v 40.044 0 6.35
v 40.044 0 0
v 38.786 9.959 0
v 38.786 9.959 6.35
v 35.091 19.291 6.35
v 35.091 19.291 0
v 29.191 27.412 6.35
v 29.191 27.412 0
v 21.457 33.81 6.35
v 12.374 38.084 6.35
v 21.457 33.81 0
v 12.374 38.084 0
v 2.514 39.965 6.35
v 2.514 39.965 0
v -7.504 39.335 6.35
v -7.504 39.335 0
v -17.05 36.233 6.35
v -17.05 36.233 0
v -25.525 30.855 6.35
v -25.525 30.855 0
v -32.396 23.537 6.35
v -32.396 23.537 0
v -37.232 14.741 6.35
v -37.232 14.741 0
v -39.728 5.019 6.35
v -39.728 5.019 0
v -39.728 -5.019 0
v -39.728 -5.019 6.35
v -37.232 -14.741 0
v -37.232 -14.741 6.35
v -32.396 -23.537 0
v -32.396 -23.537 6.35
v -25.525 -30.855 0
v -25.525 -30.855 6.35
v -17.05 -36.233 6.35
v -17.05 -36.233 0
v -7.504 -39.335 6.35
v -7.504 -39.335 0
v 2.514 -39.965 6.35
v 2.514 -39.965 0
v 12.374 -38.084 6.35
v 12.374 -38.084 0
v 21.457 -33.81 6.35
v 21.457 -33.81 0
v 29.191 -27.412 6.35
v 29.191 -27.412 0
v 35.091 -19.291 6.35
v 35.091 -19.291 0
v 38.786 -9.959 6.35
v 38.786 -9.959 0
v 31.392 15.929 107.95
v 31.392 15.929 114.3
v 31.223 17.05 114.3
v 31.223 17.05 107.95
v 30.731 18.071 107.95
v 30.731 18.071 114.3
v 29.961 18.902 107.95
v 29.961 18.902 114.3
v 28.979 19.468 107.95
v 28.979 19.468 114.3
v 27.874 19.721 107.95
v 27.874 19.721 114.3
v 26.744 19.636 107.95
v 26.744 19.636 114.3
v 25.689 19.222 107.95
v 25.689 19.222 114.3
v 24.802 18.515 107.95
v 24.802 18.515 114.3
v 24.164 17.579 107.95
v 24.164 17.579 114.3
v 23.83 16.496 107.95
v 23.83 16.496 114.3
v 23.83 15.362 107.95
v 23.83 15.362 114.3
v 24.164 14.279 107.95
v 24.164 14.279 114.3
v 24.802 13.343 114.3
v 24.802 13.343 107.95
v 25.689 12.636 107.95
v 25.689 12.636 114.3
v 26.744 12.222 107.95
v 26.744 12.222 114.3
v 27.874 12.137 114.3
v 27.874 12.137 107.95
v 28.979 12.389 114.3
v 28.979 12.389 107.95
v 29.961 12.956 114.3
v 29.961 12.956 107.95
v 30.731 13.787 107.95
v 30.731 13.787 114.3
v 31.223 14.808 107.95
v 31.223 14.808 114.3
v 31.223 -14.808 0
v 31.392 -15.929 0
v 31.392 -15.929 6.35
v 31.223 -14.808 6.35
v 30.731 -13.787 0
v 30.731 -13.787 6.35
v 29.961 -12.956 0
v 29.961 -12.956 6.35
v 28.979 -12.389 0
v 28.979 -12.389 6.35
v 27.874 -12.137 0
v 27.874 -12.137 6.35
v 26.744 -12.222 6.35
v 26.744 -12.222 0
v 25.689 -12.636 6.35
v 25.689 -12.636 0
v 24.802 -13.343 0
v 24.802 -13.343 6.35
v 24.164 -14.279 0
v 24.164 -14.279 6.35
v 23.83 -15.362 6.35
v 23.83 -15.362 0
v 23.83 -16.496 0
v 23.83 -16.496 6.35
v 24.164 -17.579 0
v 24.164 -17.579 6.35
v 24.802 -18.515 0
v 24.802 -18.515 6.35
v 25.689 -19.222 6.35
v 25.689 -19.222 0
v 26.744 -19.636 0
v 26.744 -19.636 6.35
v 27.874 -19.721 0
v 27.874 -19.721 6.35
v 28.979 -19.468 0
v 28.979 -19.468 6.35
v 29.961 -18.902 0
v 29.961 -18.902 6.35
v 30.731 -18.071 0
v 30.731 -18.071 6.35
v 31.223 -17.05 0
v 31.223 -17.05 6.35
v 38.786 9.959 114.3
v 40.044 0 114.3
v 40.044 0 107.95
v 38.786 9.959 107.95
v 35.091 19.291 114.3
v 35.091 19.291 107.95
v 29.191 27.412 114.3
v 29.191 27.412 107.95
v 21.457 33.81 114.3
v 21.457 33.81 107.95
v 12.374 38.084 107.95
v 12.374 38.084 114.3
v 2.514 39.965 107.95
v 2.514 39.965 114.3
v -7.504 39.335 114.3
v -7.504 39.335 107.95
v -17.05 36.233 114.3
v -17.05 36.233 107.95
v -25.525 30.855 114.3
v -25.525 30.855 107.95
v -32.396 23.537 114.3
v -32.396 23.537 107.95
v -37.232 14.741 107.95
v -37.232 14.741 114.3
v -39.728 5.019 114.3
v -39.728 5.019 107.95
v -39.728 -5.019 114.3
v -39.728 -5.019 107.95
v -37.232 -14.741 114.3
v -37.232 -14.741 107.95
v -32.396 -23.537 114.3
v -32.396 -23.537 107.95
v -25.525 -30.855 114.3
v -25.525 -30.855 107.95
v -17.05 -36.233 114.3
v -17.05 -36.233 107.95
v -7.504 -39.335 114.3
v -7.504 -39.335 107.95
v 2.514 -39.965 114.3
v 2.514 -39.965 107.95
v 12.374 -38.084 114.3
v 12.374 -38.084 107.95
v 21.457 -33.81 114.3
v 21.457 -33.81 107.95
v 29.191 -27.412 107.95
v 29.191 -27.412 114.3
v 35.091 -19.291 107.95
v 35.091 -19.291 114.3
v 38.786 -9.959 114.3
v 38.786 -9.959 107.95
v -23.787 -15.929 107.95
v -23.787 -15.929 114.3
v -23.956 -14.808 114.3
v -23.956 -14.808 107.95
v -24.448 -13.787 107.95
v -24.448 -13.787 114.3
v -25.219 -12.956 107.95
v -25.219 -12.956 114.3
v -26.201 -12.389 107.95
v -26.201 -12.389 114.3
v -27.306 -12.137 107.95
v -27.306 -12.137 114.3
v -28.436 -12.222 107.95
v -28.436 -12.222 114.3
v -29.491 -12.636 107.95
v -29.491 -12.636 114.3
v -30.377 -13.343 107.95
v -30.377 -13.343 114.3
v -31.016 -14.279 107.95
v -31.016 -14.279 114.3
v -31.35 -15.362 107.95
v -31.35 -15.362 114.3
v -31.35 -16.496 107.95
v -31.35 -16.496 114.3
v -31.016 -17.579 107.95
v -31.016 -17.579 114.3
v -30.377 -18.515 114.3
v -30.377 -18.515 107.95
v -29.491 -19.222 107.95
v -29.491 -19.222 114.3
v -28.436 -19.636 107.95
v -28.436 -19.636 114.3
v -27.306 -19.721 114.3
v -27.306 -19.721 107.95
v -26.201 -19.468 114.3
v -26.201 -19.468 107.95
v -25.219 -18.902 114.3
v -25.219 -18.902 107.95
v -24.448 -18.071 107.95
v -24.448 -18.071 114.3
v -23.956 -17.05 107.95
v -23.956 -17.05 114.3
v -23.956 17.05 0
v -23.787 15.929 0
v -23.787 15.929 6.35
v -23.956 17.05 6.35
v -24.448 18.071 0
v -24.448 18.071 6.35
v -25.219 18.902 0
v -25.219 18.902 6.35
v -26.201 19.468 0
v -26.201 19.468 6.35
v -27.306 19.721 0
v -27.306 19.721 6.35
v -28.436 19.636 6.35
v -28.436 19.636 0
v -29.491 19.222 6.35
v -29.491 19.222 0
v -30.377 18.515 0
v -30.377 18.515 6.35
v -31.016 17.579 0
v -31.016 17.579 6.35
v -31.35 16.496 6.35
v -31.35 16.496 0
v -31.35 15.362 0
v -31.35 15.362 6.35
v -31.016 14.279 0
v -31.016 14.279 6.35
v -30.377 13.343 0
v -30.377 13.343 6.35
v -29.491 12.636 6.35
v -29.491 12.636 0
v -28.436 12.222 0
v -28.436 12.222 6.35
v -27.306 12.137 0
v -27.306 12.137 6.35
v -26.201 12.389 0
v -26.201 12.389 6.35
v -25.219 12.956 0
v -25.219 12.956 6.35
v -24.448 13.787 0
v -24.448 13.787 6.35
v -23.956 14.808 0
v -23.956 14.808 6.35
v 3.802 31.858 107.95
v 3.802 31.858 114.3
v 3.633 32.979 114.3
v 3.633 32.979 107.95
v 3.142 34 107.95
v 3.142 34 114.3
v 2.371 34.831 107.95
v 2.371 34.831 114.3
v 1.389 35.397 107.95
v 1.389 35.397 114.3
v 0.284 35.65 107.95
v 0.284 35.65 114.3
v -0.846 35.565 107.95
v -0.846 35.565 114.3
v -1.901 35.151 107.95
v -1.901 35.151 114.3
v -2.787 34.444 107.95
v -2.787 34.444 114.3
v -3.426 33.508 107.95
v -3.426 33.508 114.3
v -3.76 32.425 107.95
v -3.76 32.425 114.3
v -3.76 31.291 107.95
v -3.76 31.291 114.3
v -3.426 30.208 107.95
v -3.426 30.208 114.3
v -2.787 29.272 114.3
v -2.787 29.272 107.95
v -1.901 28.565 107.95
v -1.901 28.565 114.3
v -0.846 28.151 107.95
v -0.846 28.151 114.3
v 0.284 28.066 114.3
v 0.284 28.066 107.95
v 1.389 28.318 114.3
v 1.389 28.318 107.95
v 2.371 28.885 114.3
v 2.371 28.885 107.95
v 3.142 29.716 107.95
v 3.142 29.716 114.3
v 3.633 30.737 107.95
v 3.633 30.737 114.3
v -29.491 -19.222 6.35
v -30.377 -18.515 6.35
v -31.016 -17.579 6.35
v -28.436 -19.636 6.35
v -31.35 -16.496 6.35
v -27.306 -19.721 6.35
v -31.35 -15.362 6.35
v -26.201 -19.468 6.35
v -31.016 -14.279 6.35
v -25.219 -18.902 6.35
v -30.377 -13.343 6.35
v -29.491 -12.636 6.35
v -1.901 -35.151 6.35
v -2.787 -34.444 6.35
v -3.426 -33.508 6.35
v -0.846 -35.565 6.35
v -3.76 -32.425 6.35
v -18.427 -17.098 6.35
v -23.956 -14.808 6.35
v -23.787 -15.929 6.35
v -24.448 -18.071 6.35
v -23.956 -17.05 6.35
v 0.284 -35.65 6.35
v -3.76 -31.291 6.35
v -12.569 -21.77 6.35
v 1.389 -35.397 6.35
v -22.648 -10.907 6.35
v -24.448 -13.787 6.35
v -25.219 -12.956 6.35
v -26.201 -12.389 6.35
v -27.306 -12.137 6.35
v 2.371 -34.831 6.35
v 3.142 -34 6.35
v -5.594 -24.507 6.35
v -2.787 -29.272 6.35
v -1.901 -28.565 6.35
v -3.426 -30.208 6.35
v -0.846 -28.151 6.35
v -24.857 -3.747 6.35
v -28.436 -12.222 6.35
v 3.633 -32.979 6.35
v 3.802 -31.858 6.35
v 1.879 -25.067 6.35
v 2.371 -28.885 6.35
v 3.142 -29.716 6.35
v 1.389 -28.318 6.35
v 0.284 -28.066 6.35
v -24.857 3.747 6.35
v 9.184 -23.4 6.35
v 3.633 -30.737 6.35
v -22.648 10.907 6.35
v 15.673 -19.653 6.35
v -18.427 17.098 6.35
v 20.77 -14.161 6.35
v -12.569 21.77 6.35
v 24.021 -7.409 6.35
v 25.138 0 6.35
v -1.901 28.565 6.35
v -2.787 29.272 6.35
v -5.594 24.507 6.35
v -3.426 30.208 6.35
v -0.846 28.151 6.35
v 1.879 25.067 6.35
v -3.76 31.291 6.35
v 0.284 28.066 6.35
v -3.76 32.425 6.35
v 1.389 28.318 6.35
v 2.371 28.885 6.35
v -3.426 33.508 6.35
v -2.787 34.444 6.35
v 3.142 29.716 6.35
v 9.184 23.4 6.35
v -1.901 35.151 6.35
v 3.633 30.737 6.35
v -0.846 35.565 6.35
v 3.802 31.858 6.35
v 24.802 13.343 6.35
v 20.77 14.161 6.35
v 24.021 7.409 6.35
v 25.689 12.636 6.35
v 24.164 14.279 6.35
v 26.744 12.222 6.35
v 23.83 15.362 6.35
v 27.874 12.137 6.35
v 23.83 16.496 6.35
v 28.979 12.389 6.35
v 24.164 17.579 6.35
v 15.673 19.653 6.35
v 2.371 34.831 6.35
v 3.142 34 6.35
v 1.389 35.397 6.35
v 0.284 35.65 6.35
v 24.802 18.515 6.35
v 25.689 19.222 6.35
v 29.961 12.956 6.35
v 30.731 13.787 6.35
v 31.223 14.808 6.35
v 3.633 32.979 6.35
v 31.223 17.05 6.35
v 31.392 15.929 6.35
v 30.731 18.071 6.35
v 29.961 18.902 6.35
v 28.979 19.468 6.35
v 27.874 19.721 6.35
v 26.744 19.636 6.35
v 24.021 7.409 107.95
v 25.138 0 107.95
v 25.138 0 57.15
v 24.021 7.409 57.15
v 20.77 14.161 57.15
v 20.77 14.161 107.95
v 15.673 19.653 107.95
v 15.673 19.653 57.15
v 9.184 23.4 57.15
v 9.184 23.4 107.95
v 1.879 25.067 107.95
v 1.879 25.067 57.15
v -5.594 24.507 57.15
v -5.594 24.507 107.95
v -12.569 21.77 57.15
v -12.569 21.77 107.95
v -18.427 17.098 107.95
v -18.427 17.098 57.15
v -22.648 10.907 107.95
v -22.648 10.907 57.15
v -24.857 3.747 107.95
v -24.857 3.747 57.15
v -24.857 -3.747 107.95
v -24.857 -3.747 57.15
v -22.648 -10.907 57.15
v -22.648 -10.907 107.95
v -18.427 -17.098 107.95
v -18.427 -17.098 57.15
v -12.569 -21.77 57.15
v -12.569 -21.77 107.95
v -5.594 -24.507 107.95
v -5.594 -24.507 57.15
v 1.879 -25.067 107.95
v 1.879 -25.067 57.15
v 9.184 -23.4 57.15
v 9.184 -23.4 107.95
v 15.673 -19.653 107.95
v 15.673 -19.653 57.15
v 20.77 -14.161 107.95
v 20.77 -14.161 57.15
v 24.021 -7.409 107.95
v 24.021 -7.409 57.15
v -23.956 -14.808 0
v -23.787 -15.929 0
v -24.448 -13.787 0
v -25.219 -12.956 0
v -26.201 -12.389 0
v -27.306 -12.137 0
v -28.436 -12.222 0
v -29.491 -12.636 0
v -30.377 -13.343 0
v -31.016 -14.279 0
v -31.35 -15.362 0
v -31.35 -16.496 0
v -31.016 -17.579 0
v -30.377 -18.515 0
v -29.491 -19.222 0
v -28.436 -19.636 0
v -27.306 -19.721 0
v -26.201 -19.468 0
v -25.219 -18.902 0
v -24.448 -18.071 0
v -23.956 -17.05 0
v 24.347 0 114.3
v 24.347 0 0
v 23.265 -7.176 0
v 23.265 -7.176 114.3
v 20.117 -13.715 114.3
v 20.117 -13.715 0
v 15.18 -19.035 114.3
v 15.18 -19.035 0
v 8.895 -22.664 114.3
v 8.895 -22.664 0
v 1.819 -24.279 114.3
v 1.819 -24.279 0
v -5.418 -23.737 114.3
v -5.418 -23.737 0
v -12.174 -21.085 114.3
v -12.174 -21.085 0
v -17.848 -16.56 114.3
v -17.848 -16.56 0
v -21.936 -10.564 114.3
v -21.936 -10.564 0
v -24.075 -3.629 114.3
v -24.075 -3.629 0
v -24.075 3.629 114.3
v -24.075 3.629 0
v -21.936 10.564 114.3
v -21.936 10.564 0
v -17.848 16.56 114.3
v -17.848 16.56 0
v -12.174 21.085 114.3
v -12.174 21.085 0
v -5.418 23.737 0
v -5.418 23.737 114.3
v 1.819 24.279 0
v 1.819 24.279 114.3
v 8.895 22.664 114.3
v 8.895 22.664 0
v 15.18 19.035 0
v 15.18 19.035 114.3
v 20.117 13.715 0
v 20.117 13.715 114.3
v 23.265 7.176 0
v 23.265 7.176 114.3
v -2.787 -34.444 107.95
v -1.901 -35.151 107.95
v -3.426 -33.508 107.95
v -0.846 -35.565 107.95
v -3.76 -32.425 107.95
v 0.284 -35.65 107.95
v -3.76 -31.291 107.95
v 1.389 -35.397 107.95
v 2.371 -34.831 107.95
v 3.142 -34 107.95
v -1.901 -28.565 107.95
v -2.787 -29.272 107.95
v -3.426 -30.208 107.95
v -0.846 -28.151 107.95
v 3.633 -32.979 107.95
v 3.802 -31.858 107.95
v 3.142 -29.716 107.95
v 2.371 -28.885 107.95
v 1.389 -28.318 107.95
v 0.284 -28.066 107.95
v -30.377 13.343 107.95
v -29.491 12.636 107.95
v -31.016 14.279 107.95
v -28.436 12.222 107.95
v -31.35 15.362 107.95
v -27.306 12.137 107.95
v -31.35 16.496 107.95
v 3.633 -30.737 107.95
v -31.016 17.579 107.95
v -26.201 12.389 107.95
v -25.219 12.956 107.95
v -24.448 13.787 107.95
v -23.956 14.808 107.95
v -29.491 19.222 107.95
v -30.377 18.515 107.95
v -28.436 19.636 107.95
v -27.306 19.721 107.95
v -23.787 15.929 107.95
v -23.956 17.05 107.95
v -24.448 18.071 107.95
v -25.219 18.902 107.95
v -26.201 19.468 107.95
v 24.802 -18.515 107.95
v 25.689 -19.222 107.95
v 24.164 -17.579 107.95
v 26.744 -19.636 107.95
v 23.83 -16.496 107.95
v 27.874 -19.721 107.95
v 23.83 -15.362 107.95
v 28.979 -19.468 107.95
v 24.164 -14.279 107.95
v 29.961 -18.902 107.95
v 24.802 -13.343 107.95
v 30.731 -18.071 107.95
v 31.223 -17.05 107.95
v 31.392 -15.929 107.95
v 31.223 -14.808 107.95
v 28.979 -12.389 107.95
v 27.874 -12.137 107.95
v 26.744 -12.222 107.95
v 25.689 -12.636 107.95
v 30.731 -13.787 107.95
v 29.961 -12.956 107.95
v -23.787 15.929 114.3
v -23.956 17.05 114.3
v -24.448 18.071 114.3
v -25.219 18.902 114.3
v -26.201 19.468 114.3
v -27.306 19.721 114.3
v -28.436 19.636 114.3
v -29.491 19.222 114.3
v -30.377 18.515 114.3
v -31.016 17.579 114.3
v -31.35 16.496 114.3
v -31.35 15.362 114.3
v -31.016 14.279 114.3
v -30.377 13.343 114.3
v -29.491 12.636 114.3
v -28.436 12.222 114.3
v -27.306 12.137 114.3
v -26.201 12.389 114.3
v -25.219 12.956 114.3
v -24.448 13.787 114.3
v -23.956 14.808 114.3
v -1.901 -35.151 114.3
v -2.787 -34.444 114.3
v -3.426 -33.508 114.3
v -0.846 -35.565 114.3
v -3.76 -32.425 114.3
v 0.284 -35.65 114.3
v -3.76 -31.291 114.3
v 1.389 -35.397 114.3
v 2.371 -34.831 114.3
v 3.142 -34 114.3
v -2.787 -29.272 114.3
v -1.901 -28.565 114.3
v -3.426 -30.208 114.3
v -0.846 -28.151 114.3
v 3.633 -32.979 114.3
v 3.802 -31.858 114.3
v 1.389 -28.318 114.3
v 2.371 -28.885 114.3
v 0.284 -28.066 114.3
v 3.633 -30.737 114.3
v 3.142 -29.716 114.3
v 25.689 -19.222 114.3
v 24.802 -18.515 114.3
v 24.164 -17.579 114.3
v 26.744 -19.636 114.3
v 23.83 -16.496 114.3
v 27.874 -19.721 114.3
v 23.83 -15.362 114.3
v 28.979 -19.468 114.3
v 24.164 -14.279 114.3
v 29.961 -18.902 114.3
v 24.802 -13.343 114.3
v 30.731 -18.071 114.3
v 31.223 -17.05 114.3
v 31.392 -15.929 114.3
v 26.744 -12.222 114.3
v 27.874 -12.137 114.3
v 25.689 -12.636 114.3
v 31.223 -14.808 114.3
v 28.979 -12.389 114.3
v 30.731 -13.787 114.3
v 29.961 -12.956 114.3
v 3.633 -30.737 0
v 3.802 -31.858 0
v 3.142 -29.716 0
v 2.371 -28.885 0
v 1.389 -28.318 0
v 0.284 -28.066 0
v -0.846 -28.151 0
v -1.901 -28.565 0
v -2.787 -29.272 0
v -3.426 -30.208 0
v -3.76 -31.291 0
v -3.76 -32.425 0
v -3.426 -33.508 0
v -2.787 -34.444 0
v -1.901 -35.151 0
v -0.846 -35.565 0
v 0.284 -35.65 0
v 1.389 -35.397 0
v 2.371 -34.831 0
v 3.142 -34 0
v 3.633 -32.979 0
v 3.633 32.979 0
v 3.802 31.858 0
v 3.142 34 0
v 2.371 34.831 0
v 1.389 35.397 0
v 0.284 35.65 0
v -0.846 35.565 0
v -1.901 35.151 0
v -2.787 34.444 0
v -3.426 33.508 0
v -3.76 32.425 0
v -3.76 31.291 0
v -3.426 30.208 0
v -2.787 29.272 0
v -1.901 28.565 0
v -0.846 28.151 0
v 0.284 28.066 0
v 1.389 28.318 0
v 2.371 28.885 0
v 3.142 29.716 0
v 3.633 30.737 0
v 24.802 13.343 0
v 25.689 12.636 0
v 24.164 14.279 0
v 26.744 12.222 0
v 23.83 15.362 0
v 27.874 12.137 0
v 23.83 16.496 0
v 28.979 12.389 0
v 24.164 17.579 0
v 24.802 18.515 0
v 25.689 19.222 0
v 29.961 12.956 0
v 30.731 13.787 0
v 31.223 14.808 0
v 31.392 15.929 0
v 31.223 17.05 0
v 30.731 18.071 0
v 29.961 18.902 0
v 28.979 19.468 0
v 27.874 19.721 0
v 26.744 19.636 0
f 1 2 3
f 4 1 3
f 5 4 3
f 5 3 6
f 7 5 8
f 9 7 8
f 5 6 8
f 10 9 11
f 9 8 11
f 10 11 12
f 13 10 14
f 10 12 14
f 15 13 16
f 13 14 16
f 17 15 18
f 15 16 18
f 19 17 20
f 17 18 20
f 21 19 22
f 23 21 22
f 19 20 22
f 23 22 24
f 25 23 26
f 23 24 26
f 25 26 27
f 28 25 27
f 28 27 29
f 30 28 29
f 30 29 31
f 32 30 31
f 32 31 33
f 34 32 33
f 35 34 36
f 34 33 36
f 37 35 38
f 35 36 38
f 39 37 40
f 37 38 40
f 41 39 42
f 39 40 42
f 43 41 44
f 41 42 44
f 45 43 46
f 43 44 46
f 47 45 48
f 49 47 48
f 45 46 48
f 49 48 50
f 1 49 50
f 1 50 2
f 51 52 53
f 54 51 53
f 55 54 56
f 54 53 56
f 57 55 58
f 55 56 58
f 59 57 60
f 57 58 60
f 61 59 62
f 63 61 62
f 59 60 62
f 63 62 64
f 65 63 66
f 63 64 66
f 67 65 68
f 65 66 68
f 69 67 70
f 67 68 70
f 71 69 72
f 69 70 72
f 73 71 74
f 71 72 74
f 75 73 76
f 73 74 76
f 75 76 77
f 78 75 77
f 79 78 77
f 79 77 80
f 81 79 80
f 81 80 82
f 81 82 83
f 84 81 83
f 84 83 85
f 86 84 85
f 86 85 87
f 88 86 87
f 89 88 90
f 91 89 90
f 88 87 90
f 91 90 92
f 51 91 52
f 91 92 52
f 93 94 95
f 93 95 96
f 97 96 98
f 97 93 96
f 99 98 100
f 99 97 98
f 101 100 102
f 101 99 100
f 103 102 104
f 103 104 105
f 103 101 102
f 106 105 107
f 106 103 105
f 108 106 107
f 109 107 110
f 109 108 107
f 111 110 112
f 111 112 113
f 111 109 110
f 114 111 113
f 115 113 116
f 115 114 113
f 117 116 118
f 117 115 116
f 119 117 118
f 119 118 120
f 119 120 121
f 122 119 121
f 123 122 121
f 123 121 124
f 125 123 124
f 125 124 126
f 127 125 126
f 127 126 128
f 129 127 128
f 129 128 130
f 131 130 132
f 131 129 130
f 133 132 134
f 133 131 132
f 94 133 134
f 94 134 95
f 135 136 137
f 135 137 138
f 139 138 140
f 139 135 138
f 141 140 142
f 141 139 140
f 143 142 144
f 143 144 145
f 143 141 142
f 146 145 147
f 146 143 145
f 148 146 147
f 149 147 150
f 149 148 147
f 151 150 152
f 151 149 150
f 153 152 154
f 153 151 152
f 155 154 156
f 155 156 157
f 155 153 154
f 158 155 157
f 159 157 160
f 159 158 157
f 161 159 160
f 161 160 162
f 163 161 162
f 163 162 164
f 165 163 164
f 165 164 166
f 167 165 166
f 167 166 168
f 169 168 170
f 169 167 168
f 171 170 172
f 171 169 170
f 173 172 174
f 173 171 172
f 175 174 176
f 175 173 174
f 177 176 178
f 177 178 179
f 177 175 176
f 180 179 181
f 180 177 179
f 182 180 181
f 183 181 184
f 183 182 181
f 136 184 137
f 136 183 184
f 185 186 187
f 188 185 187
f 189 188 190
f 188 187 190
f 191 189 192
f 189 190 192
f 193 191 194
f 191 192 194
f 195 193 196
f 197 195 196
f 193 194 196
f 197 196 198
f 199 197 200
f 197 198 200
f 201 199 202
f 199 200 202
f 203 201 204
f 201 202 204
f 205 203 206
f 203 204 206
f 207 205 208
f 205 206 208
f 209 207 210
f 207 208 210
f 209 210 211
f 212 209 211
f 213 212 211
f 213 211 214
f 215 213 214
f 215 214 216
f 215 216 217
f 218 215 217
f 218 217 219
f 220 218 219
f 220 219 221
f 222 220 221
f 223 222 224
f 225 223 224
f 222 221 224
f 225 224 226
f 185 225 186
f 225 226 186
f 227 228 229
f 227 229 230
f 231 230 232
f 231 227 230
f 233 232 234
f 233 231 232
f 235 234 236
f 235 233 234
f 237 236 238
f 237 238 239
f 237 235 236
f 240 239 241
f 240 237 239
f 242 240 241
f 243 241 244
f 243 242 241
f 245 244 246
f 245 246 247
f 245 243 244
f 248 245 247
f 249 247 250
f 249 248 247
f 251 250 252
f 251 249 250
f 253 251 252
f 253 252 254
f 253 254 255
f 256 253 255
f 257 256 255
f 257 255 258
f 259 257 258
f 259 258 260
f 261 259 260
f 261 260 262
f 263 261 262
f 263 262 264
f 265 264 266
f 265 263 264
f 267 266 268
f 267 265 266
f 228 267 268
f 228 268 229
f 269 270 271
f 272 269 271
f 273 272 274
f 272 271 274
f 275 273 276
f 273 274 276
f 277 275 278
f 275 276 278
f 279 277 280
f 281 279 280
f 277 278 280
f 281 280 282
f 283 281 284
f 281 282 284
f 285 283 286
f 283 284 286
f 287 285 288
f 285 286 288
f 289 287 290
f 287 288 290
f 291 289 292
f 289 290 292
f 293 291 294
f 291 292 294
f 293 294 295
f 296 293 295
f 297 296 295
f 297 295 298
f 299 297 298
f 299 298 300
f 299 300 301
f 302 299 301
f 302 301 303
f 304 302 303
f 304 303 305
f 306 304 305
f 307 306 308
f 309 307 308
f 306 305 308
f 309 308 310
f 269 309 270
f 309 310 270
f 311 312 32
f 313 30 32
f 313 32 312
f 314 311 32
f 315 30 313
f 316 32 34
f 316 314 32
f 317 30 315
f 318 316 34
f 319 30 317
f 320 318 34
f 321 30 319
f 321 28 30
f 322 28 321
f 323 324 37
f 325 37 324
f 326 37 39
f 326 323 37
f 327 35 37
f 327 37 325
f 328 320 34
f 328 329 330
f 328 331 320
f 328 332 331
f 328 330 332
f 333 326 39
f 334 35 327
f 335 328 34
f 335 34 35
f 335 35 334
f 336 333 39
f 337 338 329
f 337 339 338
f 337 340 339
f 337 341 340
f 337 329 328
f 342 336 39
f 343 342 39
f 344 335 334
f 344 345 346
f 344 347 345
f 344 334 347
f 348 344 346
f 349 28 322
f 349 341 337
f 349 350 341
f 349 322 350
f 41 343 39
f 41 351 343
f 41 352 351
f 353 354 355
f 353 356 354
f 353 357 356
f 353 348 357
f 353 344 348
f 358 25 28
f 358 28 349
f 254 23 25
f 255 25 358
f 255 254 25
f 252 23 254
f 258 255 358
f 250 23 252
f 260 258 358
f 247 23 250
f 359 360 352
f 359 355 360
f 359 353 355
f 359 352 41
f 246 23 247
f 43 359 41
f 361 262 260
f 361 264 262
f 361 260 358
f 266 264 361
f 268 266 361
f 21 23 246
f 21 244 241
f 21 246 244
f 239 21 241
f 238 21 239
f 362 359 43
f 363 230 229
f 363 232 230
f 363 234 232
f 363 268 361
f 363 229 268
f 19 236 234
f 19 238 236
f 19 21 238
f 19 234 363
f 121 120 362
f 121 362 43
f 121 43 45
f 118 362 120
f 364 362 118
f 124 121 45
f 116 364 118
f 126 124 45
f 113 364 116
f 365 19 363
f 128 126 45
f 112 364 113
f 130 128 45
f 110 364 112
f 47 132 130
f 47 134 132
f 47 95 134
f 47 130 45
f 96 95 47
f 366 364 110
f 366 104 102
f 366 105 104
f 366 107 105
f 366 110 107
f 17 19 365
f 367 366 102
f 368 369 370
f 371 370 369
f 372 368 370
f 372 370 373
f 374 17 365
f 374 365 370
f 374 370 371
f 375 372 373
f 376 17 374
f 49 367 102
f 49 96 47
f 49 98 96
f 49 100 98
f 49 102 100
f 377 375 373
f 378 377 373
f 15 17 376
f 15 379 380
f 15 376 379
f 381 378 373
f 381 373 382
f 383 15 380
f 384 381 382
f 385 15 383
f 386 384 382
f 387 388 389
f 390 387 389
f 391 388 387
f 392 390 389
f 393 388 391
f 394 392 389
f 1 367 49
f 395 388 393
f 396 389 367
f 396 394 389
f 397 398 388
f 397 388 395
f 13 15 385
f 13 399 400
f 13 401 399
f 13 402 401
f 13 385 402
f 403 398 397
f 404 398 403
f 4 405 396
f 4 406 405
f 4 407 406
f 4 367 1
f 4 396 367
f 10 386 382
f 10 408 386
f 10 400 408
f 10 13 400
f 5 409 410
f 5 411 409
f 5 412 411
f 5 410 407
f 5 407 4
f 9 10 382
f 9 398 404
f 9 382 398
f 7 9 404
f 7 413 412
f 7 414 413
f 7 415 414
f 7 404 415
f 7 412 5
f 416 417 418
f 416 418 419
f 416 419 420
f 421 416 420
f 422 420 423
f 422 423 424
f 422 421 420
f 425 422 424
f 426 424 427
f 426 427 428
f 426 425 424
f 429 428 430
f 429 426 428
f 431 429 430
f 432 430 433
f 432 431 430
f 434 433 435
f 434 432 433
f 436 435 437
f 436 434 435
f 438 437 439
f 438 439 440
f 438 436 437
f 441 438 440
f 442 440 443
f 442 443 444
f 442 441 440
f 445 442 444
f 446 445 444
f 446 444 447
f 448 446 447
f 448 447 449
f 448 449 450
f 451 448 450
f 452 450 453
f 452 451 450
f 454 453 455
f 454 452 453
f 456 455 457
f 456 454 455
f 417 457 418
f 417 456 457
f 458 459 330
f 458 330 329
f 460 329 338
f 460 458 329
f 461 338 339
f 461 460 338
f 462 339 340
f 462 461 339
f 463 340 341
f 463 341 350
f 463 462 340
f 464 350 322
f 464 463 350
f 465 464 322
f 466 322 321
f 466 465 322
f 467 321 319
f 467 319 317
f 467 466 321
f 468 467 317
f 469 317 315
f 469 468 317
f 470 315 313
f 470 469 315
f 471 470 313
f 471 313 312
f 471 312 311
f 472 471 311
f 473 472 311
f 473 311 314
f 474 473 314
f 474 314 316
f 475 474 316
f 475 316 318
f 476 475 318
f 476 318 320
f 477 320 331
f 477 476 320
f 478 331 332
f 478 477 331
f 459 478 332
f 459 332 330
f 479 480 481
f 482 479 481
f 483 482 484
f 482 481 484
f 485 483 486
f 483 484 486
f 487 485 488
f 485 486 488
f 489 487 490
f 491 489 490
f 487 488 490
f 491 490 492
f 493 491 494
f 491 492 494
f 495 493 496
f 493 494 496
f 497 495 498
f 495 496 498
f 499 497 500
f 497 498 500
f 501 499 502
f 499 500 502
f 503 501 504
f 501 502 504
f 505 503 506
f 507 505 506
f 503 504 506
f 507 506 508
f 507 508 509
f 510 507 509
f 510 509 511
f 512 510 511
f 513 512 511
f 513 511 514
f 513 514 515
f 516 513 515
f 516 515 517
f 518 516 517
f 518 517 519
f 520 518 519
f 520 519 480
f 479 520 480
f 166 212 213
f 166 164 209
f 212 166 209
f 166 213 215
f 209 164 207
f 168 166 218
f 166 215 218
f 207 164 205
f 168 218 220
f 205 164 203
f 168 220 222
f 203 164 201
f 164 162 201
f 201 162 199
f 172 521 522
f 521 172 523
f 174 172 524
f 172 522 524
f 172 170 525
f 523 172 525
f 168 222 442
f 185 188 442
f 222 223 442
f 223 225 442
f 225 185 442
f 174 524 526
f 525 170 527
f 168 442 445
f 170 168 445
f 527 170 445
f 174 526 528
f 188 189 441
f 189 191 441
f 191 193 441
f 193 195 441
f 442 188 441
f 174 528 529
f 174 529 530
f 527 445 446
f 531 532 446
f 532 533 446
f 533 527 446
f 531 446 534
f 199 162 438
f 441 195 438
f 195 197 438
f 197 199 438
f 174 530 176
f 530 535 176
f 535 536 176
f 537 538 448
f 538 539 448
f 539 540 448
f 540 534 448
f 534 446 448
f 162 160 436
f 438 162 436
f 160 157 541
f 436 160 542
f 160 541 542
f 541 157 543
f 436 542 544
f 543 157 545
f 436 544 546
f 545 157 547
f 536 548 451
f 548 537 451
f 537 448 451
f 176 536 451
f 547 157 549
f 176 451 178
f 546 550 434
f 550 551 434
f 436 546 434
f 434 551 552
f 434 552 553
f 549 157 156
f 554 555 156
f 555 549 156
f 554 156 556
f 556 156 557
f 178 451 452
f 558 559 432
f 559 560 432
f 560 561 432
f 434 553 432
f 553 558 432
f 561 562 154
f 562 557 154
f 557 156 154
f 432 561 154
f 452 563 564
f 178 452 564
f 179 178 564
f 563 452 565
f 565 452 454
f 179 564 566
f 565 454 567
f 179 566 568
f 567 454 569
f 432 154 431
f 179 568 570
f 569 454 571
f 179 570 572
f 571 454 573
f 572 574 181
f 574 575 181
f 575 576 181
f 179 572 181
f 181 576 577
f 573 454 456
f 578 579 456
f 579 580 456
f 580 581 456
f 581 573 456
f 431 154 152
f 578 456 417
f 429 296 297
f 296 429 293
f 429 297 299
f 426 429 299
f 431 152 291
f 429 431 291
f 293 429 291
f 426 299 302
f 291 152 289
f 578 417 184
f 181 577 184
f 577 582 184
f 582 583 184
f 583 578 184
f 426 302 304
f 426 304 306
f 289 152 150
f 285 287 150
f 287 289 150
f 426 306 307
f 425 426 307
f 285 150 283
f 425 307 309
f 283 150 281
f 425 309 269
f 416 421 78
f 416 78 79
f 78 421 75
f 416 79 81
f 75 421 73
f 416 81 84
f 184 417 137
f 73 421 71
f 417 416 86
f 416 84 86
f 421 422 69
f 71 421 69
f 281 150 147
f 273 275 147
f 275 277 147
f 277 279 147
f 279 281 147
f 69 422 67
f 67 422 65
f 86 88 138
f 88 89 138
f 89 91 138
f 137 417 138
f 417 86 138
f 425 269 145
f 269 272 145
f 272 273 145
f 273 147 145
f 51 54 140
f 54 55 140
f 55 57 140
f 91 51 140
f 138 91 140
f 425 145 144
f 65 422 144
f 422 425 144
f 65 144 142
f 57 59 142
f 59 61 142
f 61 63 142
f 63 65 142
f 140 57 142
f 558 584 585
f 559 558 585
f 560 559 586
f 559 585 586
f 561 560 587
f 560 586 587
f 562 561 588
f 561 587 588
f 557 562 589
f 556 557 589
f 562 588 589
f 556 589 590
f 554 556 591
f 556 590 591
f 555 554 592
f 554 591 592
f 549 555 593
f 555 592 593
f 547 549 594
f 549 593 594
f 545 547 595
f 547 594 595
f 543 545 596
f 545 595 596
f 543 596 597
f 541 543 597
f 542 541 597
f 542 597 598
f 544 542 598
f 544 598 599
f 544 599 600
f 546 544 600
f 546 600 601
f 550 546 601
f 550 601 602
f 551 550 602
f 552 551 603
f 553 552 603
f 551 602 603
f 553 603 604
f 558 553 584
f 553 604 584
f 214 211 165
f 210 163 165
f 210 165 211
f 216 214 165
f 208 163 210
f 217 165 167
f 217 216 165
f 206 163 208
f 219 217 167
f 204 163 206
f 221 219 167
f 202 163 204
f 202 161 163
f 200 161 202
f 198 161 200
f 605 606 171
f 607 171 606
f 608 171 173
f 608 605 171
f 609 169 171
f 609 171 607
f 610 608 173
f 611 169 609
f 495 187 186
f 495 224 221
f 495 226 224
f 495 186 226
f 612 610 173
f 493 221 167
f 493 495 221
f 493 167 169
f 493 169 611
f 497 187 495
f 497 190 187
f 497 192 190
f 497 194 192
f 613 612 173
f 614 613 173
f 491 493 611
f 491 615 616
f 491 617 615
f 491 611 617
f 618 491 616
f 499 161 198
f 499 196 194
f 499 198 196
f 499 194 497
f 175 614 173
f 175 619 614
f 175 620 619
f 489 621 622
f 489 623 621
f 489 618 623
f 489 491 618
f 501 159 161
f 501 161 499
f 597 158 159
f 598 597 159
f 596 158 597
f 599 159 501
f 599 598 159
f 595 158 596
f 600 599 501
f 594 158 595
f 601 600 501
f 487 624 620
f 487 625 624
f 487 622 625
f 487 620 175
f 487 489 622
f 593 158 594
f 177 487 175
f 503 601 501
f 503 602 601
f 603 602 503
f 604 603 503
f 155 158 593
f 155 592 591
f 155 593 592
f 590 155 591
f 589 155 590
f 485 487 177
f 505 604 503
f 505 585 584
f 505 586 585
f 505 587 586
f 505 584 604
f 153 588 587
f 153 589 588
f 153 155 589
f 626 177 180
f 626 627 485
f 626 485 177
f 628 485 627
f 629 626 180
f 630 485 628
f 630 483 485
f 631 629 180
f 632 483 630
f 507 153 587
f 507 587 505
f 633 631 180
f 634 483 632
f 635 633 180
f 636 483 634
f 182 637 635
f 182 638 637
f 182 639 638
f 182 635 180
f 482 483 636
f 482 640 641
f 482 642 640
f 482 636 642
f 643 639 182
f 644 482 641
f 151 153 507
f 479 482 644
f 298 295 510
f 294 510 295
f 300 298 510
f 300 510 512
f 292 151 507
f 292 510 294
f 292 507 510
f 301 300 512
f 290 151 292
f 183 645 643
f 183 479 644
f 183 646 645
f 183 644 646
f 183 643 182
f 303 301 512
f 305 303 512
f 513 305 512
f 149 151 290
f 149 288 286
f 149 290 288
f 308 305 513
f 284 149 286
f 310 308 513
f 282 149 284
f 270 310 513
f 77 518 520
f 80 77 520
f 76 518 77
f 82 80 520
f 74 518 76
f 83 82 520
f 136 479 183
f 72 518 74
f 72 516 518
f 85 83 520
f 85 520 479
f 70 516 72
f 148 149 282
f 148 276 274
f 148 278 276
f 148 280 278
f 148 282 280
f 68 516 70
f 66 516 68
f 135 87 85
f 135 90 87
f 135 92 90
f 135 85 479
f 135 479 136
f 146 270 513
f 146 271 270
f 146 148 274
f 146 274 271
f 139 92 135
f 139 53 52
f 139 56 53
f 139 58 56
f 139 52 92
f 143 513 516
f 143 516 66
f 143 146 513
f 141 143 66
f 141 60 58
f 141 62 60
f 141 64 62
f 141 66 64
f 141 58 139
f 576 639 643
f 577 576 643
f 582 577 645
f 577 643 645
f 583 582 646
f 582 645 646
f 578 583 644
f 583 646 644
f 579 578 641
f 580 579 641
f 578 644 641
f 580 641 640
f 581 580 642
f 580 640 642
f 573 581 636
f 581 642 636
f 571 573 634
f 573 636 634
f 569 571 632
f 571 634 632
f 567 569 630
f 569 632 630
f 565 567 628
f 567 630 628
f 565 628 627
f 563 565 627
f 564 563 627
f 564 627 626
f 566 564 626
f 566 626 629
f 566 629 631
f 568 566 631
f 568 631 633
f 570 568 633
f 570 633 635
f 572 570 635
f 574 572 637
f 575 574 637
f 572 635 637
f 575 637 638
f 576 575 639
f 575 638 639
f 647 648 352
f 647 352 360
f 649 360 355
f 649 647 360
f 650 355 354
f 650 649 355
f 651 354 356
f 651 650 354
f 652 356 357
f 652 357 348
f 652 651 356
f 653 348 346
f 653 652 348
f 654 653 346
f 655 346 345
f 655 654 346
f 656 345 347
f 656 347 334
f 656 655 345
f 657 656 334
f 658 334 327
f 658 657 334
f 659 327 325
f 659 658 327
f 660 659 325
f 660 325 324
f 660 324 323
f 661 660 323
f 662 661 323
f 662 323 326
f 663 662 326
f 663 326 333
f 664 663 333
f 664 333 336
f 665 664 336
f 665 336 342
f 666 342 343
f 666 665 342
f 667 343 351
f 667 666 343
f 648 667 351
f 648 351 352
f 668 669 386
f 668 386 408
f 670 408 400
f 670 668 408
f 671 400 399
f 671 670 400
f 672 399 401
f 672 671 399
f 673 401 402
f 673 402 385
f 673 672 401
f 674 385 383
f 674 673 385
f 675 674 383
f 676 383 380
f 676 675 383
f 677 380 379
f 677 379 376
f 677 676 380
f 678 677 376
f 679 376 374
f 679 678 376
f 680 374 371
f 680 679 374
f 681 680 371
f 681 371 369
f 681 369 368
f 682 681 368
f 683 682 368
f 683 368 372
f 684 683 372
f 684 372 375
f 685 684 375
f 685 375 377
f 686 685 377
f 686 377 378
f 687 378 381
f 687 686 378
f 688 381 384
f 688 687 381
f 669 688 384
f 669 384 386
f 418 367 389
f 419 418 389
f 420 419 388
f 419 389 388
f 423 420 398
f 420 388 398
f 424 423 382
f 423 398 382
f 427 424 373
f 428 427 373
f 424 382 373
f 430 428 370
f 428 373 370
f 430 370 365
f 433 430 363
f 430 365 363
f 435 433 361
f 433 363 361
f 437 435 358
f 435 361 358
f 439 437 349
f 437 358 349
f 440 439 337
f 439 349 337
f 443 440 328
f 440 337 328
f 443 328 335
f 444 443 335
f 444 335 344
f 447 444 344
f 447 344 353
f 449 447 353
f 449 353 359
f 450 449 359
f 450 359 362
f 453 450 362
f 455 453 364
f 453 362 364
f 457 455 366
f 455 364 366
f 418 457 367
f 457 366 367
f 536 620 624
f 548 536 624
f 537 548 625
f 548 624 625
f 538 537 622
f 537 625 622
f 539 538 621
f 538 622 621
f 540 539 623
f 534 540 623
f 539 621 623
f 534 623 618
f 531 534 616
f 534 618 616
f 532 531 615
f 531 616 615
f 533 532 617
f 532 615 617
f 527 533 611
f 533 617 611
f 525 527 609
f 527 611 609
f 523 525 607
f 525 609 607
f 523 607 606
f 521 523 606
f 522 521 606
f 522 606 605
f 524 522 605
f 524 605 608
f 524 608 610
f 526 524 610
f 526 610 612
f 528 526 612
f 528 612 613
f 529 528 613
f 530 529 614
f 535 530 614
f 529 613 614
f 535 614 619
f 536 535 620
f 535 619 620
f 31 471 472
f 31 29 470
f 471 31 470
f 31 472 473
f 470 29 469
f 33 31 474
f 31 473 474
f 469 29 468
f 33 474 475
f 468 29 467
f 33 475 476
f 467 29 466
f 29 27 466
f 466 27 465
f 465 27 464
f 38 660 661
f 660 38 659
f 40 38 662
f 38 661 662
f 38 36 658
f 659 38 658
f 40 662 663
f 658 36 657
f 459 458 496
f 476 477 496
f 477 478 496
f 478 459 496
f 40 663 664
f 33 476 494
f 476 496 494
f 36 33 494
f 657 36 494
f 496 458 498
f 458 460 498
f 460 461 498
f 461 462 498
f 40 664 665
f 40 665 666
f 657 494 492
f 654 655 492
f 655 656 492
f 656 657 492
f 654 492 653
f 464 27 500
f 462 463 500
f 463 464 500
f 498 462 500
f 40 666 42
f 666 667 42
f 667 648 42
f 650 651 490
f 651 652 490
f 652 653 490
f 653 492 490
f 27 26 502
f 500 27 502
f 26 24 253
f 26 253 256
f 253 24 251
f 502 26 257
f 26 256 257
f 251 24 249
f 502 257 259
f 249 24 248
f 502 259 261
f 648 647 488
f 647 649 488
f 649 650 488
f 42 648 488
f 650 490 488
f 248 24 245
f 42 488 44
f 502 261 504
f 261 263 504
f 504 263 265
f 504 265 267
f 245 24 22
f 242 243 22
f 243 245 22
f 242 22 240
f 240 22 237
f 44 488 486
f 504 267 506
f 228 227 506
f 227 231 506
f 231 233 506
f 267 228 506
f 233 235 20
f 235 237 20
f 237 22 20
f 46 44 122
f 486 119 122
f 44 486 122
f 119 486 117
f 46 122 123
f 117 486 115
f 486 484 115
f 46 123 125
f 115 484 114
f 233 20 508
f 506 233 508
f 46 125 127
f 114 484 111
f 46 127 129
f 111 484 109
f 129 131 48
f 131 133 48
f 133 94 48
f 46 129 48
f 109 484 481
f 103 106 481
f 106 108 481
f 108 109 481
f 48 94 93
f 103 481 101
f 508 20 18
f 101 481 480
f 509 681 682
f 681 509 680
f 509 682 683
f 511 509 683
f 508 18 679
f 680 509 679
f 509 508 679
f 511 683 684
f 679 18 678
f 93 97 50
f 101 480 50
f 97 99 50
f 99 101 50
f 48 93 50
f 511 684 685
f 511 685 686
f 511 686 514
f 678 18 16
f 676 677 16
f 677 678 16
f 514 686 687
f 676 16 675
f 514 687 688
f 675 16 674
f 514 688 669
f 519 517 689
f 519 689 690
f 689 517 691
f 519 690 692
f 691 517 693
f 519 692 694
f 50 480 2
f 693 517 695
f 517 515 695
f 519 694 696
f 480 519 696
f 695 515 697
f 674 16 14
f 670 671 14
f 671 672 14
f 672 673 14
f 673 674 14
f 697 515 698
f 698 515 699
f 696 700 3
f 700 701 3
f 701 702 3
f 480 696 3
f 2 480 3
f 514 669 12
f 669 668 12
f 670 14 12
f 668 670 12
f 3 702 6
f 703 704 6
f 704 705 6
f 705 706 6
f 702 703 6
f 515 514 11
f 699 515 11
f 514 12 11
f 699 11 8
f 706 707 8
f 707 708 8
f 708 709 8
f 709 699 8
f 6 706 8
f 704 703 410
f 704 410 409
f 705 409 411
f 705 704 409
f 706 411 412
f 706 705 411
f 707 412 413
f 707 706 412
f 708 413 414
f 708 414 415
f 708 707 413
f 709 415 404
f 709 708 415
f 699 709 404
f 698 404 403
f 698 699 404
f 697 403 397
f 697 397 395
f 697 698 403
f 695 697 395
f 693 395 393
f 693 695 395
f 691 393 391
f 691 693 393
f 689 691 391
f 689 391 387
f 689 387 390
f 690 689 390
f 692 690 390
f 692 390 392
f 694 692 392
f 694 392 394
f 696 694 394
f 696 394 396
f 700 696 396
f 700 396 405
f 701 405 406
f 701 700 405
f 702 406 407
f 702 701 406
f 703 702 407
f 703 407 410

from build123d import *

# Parameters (mm, degrees)
F0_R     = 40.044242968
F0_R_2   = 3.8023358025
F1_DEPTH = 6.35
F2_R     = 25.1375995998
F3_DEPTH = 50.8
F5_R     = 24.3470793068
F6_DEPTH = 114.301


with BuildPart() as f1:
    # F0 (on Top) → F1 (new body)
    with BuildSketch(Plane.XY):
        Circle(F0_R)
        with Locations((-27.5898085333, -15.9289833836)):
            Circle(F0_R_2, mode=Mode.SUBTRACT)
        with Locations((0, -31.8579667672)):
            Circle(F0_R_2, mode=Mode.SUBTRACT)
        with Locations((27.5898085333, -15.9289833836)):
            Circle(F0_R_2, mode=Mode.SUBTRACT)
        with Locations((-27.5898085333, 15.9289833836)):
            Circle(F0_R_2, mode=Mode.SUBTRACT)
        with Locations((27.5898085333, 15.9289833836)):
            Circle(F0_R_2, mode=Mode.SUBTRACT)
        with Locations((0, 31.8579667672)):
            Circle(F0_R_2, mode=Mode.SUBTRACT)
    extrude(amount=F1_DEPTH)

    # F2 (on face) → F3 (join)
    with BuildSketch(Plane.XY.offset(6.35)):
        Circle(F2_R)
    extrude(amount=F3_DEPTH)

    # F4: F1 across face


with BuildPart() as f1_1:
    add(f1.part)
    add(f1.part.mirror(Plane.XY.offset(57.15)))

    # F5 (on face) → F6 (cut, through all)
    with BuildSketch(Plane(origin=(0, 0, 0), x_dir=(1, 0, 0), z_dir=(0, 0, -1))):
        Circle(F5_R)
    extrude(amount=-F6_DEPTH, mode=Mode.SUBTRACT)


solid = f1_1.part
